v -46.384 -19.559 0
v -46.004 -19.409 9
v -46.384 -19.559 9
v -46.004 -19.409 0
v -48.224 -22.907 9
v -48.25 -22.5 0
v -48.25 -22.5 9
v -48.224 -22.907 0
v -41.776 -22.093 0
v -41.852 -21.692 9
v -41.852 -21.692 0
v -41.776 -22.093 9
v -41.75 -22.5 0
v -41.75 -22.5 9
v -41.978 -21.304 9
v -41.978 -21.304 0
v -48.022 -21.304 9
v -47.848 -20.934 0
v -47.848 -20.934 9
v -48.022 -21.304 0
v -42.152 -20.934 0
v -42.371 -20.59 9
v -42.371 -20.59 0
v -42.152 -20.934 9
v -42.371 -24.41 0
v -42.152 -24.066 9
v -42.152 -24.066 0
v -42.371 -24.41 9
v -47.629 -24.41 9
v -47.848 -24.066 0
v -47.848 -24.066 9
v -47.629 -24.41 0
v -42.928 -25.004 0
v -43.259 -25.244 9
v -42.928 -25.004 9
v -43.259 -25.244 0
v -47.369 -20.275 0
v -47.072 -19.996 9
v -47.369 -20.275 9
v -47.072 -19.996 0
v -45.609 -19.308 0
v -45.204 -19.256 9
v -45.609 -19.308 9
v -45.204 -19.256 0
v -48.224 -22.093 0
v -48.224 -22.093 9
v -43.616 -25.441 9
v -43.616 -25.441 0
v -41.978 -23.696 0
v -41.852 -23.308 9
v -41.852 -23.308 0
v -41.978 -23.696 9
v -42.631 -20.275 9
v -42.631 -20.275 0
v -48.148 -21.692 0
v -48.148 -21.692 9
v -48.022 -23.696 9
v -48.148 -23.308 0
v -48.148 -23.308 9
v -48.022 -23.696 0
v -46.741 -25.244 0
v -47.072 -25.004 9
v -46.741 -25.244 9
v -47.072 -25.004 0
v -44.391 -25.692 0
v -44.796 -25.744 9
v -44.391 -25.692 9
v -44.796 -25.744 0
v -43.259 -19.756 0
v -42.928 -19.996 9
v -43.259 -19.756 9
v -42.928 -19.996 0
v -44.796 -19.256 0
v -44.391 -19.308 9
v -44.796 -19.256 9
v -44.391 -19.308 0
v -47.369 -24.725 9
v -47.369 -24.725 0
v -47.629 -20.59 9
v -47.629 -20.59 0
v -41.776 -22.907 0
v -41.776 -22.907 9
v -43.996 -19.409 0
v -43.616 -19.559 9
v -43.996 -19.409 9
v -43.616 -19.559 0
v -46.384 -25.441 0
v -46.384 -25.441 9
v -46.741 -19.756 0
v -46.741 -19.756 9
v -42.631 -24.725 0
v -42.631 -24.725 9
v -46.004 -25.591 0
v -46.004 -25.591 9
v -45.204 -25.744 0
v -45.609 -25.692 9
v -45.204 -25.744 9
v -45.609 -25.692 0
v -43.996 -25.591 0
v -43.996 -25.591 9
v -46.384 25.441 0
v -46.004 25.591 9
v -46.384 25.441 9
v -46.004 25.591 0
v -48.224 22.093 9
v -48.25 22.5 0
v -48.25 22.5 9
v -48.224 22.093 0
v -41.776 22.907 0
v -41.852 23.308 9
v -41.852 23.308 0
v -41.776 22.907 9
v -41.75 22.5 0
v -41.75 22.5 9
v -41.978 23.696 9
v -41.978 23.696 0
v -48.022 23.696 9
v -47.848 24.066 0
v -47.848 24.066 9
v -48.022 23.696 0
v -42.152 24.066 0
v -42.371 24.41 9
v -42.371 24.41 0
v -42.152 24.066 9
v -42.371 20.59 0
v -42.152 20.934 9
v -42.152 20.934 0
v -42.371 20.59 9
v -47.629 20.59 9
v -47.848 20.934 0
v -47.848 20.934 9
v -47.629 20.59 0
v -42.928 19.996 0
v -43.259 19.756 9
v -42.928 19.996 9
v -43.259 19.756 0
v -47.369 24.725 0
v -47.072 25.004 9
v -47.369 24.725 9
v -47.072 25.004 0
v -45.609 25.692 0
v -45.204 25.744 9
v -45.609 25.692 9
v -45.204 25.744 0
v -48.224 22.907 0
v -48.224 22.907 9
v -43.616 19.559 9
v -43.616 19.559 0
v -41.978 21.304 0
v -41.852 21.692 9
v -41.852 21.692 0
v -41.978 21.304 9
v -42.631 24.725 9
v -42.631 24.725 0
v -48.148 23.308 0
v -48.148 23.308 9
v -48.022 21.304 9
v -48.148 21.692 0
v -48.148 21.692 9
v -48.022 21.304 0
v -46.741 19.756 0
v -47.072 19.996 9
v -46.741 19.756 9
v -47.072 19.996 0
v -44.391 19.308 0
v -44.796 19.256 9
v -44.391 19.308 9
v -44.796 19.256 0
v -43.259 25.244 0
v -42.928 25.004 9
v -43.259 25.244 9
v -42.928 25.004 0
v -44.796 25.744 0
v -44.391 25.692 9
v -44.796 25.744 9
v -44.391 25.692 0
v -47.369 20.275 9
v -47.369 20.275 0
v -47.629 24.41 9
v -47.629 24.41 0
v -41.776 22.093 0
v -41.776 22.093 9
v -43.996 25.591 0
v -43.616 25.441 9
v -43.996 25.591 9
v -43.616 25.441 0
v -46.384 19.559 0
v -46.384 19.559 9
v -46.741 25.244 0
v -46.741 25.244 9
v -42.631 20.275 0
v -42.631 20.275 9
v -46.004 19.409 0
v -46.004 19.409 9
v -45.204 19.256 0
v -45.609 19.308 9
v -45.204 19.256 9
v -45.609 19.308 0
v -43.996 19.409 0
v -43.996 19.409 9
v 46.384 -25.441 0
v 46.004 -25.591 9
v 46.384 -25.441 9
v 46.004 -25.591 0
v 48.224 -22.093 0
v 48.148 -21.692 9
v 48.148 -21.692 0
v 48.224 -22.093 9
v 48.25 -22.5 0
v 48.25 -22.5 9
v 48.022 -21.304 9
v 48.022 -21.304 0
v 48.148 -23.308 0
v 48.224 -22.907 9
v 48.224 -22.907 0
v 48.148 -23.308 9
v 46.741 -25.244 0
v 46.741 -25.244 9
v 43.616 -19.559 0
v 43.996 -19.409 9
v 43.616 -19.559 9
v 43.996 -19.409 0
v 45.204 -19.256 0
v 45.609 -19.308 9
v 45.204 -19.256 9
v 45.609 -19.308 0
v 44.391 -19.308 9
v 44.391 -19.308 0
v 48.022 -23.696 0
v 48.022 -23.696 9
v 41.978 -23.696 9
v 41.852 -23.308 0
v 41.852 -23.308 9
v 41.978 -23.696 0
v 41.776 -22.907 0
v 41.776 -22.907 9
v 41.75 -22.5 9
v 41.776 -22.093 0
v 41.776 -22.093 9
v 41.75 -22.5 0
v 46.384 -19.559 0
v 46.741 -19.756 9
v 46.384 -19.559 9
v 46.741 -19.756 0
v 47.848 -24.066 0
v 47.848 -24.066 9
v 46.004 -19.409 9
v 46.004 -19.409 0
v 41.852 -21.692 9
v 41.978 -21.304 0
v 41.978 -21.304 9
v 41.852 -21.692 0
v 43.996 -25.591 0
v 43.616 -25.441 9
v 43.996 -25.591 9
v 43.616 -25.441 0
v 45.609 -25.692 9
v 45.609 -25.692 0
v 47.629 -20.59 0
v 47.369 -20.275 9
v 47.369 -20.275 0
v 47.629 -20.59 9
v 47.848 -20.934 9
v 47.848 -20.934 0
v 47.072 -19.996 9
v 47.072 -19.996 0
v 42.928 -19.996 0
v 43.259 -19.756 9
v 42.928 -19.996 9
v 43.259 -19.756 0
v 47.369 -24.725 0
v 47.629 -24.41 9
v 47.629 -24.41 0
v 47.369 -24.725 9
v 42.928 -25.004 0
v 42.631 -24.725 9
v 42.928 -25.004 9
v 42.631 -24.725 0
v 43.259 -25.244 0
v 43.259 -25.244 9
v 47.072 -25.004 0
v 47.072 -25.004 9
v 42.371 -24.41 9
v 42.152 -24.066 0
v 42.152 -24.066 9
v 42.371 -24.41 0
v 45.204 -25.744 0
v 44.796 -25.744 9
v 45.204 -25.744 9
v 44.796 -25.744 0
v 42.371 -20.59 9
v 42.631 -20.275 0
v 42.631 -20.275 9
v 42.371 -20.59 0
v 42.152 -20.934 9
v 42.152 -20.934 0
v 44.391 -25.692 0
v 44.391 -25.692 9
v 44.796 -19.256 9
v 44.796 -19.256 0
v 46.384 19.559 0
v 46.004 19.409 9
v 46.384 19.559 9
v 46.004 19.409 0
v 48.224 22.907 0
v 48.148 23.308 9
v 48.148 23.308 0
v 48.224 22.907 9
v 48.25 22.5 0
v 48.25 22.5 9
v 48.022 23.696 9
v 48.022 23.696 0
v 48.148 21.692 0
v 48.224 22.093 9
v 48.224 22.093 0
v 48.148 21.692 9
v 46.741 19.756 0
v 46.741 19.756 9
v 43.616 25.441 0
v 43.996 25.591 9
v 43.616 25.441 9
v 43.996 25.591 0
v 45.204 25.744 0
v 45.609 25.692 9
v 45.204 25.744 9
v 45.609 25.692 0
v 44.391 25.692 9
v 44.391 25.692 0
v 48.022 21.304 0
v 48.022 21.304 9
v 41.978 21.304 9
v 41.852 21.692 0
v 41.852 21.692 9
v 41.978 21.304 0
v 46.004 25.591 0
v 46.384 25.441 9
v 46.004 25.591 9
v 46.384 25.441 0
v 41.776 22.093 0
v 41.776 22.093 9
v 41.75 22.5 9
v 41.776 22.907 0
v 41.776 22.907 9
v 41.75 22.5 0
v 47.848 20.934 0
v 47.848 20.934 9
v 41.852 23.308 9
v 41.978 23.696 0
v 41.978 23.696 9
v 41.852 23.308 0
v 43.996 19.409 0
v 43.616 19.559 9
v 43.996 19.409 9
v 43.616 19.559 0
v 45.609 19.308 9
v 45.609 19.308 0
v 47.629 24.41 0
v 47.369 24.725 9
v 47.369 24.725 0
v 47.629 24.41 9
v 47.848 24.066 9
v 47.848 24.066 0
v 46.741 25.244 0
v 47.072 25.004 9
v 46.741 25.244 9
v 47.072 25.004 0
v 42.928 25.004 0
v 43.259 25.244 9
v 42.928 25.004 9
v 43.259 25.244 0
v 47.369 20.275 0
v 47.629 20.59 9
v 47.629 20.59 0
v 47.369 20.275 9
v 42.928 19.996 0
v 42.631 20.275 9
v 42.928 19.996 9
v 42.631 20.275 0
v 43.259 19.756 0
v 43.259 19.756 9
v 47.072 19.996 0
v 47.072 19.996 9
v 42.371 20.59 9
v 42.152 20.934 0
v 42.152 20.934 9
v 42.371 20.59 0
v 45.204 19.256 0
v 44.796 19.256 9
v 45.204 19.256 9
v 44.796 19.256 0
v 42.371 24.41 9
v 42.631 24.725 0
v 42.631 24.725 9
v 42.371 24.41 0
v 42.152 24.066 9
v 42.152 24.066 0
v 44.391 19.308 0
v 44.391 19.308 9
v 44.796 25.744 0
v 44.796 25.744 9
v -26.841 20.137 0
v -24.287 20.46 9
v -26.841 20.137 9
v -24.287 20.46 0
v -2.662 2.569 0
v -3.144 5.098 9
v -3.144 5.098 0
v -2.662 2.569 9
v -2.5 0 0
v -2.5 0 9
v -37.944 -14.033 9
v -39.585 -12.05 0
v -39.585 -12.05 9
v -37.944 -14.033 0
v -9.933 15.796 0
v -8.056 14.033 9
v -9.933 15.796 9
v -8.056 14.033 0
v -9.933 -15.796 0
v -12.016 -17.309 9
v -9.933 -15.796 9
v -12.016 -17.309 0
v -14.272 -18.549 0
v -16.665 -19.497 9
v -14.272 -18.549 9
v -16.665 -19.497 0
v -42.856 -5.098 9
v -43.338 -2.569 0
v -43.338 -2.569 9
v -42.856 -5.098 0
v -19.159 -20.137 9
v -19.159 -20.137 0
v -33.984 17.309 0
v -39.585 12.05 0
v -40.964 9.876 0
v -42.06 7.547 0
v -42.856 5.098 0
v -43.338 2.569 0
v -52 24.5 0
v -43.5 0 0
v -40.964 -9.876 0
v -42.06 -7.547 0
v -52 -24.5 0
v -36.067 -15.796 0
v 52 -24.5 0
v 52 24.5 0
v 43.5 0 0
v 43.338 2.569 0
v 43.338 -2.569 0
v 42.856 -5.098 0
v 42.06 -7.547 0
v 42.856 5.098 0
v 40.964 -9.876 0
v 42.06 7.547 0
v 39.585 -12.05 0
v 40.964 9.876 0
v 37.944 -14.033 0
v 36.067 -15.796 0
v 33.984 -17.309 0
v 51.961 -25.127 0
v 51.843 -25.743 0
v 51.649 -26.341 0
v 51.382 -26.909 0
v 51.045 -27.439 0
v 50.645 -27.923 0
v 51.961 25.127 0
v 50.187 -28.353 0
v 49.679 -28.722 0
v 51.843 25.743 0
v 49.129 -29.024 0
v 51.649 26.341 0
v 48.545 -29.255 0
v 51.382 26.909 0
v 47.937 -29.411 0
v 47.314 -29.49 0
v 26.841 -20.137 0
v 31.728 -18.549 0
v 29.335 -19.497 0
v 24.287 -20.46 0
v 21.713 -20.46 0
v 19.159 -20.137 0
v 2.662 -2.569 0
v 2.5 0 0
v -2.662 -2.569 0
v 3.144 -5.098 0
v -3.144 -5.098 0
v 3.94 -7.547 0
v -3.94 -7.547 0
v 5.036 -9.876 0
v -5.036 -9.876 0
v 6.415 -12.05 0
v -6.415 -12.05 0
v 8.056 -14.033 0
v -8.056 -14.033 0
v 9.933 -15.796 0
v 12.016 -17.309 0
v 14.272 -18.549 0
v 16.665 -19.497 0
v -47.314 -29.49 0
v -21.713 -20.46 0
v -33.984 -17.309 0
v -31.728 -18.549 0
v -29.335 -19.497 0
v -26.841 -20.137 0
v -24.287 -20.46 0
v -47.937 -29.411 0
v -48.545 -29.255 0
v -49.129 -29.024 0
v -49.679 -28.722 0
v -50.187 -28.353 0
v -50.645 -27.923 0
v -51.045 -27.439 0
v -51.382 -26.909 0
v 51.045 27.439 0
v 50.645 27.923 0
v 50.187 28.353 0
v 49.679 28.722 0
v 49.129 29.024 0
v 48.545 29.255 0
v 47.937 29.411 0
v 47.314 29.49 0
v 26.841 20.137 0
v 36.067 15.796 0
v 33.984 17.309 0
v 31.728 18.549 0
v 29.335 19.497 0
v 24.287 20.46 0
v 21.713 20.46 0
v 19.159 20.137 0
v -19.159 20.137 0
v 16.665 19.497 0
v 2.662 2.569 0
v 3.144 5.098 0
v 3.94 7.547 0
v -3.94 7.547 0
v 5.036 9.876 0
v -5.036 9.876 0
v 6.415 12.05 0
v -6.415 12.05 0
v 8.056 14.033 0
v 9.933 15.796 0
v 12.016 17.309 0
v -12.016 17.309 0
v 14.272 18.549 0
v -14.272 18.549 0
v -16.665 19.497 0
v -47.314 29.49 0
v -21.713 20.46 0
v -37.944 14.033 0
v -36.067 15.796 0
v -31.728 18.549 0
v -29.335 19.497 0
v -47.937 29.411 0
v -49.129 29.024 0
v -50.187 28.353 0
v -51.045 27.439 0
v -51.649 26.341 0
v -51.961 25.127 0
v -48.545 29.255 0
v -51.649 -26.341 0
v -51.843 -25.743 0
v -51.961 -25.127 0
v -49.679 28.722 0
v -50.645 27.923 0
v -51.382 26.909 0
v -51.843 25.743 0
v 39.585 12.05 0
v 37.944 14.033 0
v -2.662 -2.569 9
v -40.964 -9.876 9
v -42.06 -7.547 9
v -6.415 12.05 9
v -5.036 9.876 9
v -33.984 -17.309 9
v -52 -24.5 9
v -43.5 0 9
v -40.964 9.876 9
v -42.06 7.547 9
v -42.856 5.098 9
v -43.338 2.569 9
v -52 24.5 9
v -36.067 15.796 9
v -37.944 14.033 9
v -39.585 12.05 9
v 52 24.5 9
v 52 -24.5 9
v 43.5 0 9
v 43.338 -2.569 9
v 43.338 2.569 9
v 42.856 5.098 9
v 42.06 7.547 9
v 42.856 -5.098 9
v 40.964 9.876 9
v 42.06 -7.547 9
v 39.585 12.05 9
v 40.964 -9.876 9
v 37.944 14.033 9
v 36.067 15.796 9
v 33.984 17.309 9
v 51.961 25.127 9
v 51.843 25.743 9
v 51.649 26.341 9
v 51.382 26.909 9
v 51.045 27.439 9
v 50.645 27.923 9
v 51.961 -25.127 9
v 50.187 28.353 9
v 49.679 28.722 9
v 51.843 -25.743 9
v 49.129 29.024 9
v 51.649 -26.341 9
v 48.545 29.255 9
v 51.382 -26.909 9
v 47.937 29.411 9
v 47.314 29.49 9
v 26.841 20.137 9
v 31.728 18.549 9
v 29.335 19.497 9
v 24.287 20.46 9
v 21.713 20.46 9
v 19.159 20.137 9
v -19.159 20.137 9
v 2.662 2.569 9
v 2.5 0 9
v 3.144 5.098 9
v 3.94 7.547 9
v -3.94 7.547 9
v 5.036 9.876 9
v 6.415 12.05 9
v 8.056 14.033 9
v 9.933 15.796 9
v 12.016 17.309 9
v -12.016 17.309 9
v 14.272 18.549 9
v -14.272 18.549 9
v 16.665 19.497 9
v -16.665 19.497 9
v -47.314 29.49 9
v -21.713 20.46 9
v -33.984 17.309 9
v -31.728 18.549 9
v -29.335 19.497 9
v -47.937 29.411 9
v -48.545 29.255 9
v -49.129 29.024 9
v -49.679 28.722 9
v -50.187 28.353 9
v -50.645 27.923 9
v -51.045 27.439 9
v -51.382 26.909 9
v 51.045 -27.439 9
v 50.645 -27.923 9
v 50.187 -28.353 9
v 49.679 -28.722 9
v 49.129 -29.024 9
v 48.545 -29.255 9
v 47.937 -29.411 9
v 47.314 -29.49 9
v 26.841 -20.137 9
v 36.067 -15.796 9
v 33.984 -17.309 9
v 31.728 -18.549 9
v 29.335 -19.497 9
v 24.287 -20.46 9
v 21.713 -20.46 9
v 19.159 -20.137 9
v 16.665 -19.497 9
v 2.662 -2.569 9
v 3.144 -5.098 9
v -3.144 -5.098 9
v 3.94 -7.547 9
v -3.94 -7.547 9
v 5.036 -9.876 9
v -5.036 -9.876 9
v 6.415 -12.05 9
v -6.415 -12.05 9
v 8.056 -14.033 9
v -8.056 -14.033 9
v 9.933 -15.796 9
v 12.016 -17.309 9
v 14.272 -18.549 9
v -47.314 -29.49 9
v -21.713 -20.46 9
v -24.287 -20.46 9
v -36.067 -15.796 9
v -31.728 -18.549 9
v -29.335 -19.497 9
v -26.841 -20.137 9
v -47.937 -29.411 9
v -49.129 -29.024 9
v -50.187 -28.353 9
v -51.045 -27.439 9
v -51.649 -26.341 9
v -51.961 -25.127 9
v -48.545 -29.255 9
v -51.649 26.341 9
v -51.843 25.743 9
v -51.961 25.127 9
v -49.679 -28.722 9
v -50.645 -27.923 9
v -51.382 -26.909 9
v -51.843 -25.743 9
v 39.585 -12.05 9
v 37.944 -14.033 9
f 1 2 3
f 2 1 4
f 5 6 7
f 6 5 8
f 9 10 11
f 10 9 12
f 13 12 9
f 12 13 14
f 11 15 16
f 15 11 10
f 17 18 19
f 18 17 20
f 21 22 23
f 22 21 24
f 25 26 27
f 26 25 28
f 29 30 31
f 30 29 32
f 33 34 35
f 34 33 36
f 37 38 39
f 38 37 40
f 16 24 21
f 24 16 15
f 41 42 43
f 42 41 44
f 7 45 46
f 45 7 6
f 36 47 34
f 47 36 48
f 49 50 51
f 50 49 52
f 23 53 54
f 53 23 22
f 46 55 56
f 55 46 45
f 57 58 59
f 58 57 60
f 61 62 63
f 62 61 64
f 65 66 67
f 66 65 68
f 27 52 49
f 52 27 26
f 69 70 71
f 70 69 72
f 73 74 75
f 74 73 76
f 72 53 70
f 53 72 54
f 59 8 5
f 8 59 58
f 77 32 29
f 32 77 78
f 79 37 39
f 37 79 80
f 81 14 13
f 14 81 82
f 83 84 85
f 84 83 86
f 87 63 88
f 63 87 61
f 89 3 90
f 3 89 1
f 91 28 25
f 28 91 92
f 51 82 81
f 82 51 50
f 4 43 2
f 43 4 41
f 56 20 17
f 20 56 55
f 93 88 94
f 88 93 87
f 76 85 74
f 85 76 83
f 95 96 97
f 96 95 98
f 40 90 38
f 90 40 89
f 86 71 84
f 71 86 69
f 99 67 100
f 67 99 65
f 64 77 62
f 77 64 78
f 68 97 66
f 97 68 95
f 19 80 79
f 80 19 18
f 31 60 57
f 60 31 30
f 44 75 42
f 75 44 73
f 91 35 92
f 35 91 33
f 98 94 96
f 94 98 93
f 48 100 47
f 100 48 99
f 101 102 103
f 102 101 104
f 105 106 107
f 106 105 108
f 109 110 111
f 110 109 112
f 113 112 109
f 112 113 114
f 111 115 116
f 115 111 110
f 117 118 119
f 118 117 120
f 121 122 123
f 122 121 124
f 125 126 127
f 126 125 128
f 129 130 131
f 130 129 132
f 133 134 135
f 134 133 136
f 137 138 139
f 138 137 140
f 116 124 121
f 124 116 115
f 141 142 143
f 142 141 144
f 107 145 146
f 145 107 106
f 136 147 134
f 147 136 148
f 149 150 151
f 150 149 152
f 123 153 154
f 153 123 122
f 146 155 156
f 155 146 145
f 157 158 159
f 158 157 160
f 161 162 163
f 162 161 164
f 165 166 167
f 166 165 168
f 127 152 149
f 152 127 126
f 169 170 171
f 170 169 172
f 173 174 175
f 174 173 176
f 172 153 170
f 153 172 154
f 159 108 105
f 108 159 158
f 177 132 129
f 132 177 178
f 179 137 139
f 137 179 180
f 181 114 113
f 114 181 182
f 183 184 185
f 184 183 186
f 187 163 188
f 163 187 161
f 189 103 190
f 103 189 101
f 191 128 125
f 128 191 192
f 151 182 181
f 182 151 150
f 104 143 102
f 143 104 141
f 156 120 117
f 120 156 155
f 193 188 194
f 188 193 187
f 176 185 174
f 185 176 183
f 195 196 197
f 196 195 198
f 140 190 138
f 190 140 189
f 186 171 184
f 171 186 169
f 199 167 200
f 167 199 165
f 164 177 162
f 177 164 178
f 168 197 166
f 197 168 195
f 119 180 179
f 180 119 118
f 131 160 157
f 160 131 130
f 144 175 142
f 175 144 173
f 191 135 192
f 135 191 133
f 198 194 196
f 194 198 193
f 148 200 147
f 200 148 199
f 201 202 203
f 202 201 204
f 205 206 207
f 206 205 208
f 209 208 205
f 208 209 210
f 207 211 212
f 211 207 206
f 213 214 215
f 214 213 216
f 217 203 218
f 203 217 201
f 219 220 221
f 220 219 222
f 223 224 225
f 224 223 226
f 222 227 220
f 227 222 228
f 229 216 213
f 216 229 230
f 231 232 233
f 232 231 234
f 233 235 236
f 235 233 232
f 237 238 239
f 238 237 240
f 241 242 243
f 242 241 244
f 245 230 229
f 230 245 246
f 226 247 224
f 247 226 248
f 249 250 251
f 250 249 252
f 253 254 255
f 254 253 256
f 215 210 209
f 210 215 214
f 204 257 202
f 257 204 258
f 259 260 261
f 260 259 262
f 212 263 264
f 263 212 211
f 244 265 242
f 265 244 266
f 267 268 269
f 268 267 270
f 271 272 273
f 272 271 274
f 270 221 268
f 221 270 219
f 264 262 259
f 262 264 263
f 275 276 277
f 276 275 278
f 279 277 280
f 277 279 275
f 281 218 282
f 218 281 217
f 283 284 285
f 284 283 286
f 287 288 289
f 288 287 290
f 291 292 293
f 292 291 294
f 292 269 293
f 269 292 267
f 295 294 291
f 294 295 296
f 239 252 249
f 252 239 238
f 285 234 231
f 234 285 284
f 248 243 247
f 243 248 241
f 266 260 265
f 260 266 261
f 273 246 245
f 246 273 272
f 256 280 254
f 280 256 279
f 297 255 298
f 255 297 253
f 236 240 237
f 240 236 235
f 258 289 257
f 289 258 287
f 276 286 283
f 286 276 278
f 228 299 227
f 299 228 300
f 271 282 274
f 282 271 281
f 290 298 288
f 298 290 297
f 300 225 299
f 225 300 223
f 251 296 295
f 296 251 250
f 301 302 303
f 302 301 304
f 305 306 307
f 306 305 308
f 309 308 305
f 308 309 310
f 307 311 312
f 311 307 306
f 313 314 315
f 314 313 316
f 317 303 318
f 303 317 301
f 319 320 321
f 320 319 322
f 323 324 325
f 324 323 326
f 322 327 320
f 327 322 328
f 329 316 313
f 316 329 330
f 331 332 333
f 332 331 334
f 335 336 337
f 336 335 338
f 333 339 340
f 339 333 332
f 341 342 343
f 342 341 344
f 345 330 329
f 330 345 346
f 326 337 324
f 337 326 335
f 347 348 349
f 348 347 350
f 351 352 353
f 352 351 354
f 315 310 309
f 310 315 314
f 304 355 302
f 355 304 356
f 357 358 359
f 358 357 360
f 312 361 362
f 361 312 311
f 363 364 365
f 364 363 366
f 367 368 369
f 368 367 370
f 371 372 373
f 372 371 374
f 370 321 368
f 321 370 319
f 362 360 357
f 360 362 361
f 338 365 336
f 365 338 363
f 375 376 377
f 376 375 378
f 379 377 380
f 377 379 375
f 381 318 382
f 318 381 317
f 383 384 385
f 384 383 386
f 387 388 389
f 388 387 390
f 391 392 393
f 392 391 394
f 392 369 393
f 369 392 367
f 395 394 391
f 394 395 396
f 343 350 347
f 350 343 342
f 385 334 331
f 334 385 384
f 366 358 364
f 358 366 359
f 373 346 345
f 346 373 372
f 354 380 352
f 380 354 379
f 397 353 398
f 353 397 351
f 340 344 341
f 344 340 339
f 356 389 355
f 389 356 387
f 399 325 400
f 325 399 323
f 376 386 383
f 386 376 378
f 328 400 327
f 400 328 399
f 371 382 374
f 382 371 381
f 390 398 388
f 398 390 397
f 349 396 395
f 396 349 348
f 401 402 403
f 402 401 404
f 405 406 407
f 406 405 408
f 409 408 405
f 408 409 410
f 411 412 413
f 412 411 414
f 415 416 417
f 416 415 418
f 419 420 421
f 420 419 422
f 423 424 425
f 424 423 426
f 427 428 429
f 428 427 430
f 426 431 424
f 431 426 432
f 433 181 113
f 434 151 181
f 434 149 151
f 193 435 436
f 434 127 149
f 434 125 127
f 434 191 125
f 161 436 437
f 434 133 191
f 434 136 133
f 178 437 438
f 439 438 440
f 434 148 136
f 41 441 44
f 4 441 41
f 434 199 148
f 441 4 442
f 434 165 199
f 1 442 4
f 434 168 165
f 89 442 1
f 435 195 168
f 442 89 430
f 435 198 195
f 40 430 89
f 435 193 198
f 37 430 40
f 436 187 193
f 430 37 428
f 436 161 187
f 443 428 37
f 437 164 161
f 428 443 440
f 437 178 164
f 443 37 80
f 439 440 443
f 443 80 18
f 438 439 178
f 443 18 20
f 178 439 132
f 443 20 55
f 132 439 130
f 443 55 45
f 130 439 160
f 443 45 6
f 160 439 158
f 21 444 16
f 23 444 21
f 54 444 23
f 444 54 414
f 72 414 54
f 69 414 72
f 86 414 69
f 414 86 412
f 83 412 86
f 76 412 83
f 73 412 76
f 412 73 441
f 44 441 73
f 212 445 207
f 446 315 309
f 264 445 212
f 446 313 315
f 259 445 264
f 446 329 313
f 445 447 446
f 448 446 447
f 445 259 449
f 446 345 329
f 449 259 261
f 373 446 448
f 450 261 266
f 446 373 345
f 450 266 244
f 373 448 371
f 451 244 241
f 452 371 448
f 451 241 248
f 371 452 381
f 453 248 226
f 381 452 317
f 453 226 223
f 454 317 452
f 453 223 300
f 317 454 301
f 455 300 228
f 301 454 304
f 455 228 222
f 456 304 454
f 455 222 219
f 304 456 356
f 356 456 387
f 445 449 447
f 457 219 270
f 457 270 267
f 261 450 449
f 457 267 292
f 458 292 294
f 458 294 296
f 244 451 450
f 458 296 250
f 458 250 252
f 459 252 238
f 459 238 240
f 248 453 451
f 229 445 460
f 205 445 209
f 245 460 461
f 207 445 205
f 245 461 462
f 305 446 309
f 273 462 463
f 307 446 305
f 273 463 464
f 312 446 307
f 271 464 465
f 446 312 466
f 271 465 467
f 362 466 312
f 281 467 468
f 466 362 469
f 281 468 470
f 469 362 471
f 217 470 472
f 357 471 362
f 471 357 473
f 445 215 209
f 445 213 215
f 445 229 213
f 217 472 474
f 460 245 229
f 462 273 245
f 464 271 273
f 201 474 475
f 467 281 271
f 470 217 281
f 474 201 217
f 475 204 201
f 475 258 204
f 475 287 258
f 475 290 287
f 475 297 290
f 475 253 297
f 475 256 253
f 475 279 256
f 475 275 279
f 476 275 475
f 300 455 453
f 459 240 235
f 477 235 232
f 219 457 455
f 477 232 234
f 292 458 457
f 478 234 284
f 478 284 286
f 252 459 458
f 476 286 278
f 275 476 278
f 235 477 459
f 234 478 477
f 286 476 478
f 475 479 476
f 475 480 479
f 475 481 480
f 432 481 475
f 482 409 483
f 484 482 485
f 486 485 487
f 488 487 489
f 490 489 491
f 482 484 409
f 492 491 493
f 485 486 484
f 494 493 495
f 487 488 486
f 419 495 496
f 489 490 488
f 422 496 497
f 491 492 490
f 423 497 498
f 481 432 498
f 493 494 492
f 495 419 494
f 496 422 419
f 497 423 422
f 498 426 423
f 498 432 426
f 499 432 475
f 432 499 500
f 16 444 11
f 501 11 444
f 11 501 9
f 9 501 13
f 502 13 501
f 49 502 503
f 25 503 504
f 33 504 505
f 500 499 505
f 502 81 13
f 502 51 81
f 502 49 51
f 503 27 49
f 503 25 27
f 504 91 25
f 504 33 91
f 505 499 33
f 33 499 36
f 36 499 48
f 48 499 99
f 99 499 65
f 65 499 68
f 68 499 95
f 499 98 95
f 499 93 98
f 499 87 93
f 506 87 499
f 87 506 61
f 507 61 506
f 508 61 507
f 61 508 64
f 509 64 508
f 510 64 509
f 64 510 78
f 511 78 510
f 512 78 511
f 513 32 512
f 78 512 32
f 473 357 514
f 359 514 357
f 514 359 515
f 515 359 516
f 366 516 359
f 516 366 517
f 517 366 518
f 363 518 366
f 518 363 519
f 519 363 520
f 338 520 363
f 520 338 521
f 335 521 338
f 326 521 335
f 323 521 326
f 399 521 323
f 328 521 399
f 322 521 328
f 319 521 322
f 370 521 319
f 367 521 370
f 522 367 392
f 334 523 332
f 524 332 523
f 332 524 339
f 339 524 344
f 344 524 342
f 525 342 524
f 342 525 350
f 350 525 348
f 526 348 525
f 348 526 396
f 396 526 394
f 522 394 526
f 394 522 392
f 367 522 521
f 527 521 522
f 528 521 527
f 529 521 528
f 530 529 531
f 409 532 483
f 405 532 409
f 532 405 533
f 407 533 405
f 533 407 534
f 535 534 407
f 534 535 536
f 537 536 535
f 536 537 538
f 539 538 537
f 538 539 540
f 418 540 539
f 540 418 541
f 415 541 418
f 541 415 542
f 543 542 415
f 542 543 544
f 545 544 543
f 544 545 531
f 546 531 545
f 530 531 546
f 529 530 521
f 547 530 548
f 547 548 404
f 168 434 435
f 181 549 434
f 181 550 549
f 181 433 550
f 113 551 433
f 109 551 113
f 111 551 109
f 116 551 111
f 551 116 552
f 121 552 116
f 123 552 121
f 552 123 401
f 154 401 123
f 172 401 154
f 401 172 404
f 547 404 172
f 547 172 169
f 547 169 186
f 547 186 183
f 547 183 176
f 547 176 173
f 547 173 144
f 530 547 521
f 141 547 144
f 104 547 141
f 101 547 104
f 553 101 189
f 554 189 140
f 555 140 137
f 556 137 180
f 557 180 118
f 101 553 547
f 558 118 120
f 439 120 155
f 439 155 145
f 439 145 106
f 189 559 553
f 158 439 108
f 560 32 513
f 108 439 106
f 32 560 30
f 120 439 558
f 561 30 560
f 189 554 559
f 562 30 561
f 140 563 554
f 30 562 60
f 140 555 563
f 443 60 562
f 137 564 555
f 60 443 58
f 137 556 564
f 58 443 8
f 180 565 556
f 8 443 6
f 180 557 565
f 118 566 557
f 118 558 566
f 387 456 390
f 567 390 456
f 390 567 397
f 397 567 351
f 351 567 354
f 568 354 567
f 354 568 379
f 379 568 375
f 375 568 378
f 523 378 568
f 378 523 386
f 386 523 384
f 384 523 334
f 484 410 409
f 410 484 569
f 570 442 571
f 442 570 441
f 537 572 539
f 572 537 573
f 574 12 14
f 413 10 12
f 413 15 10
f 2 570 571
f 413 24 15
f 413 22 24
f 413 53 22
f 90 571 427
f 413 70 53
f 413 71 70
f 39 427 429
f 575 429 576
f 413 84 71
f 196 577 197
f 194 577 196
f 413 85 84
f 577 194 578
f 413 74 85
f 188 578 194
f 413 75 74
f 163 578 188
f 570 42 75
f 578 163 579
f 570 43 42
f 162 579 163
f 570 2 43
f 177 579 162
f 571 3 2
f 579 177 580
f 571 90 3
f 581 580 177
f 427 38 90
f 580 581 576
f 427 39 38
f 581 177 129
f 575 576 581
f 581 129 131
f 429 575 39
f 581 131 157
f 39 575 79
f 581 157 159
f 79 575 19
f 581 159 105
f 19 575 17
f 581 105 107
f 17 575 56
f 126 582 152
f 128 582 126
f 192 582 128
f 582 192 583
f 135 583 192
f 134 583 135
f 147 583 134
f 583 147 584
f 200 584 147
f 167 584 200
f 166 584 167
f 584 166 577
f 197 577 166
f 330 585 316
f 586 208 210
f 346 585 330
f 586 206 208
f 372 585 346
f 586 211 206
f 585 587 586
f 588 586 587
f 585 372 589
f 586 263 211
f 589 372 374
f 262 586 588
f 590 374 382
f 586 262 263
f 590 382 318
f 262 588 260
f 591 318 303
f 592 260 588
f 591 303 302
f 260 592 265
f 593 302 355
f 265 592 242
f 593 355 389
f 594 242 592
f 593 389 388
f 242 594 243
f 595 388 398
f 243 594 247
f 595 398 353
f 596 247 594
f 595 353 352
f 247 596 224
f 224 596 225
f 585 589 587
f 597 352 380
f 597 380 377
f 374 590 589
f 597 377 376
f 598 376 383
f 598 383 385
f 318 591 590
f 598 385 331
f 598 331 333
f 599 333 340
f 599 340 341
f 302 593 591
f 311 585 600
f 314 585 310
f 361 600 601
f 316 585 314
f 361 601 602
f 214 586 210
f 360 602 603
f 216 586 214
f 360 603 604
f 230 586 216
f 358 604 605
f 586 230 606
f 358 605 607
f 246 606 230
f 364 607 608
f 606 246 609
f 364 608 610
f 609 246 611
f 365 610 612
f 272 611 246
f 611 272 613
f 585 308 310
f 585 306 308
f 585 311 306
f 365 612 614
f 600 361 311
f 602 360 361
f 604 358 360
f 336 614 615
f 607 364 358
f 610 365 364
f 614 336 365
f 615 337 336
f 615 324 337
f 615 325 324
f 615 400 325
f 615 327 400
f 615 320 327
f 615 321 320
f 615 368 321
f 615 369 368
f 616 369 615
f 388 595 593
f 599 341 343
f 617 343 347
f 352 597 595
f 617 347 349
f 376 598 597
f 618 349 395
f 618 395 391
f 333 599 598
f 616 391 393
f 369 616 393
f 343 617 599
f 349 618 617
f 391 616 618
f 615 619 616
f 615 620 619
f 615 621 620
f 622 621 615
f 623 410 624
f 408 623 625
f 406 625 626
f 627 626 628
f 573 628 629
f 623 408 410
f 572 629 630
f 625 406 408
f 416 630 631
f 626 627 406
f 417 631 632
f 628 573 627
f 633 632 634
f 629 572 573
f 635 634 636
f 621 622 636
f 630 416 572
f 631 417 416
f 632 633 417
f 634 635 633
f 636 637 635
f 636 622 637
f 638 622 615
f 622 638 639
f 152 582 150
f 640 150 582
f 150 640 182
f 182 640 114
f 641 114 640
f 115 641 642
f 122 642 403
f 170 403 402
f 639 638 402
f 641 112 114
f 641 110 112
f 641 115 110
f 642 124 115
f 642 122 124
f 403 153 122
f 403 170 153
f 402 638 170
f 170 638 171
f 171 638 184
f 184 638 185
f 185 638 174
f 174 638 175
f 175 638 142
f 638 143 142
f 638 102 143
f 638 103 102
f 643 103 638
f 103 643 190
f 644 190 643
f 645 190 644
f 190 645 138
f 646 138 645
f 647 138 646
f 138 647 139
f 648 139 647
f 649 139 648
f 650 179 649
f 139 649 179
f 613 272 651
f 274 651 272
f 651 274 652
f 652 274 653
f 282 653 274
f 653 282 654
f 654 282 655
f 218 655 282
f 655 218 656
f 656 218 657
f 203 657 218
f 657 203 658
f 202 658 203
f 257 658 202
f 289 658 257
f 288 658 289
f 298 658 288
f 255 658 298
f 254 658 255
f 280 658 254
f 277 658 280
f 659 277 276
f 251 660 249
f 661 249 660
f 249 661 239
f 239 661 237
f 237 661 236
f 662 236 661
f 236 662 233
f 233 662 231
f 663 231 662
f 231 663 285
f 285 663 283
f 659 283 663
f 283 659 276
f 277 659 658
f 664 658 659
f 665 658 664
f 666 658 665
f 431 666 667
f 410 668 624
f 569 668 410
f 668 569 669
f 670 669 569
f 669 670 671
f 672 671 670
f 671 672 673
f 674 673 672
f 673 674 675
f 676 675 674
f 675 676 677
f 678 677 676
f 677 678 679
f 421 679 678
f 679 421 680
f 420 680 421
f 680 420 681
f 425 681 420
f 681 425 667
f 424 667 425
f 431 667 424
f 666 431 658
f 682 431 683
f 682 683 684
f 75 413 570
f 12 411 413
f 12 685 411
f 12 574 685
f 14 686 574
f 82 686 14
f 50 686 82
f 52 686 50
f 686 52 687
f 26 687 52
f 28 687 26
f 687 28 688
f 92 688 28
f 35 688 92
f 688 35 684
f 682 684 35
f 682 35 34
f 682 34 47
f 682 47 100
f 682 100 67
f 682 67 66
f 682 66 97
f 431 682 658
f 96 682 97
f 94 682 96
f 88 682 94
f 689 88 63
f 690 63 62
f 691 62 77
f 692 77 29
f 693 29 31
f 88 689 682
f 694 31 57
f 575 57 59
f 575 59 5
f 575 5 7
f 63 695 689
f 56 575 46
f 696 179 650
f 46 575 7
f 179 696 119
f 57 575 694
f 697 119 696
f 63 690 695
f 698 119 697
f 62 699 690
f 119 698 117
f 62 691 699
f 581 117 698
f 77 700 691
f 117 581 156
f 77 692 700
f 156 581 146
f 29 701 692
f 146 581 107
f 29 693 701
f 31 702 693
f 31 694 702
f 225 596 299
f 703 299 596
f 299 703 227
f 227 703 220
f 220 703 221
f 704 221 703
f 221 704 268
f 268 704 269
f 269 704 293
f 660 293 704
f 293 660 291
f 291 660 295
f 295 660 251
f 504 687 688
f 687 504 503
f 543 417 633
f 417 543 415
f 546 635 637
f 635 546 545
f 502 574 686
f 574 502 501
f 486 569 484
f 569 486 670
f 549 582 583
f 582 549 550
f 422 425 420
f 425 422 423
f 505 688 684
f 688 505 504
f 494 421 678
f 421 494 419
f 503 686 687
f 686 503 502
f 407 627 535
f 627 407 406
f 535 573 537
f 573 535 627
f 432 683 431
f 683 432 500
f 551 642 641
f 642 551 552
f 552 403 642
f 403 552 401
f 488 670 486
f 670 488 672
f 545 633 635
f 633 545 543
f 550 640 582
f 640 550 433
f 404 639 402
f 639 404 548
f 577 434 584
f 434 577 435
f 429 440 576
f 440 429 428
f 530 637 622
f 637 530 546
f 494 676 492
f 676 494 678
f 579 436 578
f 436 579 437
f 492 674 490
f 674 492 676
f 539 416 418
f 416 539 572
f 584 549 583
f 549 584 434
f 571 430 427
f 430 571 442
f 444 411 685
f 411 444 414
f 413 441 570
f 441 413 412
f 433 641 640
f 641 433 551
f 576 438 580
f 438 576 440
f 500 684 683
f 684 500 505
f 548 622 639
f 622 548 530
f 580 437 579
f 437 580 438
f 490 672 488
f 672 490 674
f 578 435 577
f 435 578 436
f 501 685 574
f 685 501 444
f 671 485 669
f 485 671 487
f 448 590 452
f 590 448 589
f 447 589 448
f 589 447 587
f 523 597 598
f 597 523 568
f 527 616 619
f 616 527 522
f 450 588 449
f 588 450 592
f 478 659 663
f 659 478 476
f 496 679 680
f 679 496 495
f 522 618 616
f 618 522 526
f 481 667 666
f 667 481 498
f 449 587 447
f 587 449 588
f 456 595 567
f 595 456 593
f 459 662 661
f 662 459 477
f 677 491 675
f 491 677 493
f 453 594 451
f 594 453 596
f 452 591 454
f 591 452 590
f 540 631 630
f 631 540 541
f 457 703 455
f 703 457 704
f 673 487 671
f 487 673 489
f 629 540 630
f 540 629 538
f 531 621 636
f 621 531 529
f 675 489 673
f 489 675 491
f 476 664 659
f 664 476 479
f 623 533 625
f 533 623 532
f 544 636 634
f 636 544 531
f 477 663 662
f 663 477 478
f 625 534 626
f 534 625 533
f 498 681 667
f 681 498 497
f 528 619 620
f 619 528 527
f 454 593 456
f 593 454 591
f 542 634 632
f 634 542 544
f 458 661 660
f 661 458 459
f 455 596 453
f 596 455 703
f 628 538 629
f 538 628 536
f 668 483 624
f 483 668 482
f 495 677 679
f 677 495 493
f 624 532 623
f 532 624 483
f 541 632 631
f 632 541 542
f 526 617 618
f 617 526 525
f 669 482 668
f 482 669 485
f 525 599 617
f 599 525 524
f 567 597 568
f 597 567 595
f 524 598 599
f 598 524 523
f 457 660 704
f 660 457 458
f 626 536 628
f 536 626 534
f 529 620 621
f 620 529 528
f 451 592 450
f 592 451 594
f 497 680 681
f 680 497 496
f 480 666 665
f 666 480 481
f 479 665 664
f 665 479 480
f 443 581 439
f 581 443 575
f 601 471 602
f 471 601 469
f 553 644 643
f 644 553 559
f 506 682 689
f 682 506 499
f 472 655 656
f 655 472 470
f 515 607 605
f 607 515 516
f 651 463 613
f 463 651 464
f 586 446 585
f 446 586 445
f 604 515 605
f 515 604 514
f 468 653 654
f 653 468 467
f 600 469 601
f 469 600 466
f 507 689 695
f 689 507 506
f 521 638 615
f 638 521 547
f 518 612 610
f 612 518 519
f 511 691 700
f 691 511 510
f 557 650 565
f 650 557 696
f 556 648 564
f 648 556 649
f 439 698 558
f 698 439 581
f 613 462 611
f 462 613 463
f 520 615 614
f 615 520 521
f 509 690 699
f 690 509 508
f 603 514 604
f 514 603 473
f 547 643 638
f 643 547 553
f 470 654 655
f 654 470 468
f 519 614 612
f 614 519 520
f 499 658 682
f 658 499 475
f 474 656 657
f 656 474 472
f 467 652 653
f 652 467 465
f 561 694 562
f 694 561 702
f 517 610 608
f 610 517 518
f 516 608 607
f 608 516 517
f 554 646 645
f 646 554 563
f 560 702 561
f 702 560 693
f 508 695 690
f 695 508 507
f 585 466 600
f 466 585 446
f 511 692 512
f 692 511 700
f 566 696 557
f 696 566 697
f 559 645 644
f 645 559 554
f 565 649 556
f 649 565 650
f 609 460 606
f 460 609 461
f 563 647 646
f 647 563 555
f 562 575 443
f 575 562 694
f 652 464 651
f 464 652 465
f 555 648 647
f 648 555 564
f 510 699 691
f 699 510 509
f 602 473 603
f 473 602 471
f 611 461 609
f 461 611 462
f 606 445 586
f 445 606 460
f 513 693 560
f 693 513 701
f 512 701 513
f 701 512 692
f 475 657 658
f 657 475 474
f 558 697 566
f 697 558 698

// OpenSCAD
$fn = 50;

difference() {
	union() {
		hull() {
			translate(v = [-47.0, 24.5, 0]) {
				cylinder(h = 9, r = 5);
			}
			translate(v = [47.0, 24.5, 0]) {
				cylinder(h = 9, r = 5);
			}
			translate(v = [-47.0, -24.5, 0]) {
				cylinder(h = 9, r = 5);
			}
			translate(v = [47.0, -24.5, 0]) {
				cylinder(h = 9, r = 5);
			}
		}
	}
	union() {
		translate(v = [-45.0, -22.5, -100.0]) {
			cylinder(h = 200, r = 3.25);
		}
		translate(v = [-45.0, 22.5, -100.0]) {
			cylinder(h = 200, r = 3.25);
		}
		translate(v = [45.0, -22.5, -100.0]) {
			cylinder(h = 200, r = 3.25);
		}
		translate(v = [45.0, 22.5, -100.0]) {
			cylinder(h = 200, r = 3.25);
		}
		translate(v = [-45.0, -22.5, -100.0]) {
			cylinder(h = 200, r = 1.8);
		}
		translate(v = [-45.0, 22.5, -100.0]) {
			cylinder(h = 200, r = 1.8);
		}
		translate(v = [45.0, -22.5, -100.0]) {
			cylinder(h = 200, r = 1.8);
		}
		translate(v = [45.0, 22.5, -100.0]) {
			cylinder(h = 200, r = 1.8);
		}
		translate(v = [-23.0, 0, 0.0]) {
			cylinder(h = 9, r = 20.5);
		}
		translate(v = [23.0, 0, 0.0]) {
			cylinder(h = 9, r = 20.5);
		}
	}
}
